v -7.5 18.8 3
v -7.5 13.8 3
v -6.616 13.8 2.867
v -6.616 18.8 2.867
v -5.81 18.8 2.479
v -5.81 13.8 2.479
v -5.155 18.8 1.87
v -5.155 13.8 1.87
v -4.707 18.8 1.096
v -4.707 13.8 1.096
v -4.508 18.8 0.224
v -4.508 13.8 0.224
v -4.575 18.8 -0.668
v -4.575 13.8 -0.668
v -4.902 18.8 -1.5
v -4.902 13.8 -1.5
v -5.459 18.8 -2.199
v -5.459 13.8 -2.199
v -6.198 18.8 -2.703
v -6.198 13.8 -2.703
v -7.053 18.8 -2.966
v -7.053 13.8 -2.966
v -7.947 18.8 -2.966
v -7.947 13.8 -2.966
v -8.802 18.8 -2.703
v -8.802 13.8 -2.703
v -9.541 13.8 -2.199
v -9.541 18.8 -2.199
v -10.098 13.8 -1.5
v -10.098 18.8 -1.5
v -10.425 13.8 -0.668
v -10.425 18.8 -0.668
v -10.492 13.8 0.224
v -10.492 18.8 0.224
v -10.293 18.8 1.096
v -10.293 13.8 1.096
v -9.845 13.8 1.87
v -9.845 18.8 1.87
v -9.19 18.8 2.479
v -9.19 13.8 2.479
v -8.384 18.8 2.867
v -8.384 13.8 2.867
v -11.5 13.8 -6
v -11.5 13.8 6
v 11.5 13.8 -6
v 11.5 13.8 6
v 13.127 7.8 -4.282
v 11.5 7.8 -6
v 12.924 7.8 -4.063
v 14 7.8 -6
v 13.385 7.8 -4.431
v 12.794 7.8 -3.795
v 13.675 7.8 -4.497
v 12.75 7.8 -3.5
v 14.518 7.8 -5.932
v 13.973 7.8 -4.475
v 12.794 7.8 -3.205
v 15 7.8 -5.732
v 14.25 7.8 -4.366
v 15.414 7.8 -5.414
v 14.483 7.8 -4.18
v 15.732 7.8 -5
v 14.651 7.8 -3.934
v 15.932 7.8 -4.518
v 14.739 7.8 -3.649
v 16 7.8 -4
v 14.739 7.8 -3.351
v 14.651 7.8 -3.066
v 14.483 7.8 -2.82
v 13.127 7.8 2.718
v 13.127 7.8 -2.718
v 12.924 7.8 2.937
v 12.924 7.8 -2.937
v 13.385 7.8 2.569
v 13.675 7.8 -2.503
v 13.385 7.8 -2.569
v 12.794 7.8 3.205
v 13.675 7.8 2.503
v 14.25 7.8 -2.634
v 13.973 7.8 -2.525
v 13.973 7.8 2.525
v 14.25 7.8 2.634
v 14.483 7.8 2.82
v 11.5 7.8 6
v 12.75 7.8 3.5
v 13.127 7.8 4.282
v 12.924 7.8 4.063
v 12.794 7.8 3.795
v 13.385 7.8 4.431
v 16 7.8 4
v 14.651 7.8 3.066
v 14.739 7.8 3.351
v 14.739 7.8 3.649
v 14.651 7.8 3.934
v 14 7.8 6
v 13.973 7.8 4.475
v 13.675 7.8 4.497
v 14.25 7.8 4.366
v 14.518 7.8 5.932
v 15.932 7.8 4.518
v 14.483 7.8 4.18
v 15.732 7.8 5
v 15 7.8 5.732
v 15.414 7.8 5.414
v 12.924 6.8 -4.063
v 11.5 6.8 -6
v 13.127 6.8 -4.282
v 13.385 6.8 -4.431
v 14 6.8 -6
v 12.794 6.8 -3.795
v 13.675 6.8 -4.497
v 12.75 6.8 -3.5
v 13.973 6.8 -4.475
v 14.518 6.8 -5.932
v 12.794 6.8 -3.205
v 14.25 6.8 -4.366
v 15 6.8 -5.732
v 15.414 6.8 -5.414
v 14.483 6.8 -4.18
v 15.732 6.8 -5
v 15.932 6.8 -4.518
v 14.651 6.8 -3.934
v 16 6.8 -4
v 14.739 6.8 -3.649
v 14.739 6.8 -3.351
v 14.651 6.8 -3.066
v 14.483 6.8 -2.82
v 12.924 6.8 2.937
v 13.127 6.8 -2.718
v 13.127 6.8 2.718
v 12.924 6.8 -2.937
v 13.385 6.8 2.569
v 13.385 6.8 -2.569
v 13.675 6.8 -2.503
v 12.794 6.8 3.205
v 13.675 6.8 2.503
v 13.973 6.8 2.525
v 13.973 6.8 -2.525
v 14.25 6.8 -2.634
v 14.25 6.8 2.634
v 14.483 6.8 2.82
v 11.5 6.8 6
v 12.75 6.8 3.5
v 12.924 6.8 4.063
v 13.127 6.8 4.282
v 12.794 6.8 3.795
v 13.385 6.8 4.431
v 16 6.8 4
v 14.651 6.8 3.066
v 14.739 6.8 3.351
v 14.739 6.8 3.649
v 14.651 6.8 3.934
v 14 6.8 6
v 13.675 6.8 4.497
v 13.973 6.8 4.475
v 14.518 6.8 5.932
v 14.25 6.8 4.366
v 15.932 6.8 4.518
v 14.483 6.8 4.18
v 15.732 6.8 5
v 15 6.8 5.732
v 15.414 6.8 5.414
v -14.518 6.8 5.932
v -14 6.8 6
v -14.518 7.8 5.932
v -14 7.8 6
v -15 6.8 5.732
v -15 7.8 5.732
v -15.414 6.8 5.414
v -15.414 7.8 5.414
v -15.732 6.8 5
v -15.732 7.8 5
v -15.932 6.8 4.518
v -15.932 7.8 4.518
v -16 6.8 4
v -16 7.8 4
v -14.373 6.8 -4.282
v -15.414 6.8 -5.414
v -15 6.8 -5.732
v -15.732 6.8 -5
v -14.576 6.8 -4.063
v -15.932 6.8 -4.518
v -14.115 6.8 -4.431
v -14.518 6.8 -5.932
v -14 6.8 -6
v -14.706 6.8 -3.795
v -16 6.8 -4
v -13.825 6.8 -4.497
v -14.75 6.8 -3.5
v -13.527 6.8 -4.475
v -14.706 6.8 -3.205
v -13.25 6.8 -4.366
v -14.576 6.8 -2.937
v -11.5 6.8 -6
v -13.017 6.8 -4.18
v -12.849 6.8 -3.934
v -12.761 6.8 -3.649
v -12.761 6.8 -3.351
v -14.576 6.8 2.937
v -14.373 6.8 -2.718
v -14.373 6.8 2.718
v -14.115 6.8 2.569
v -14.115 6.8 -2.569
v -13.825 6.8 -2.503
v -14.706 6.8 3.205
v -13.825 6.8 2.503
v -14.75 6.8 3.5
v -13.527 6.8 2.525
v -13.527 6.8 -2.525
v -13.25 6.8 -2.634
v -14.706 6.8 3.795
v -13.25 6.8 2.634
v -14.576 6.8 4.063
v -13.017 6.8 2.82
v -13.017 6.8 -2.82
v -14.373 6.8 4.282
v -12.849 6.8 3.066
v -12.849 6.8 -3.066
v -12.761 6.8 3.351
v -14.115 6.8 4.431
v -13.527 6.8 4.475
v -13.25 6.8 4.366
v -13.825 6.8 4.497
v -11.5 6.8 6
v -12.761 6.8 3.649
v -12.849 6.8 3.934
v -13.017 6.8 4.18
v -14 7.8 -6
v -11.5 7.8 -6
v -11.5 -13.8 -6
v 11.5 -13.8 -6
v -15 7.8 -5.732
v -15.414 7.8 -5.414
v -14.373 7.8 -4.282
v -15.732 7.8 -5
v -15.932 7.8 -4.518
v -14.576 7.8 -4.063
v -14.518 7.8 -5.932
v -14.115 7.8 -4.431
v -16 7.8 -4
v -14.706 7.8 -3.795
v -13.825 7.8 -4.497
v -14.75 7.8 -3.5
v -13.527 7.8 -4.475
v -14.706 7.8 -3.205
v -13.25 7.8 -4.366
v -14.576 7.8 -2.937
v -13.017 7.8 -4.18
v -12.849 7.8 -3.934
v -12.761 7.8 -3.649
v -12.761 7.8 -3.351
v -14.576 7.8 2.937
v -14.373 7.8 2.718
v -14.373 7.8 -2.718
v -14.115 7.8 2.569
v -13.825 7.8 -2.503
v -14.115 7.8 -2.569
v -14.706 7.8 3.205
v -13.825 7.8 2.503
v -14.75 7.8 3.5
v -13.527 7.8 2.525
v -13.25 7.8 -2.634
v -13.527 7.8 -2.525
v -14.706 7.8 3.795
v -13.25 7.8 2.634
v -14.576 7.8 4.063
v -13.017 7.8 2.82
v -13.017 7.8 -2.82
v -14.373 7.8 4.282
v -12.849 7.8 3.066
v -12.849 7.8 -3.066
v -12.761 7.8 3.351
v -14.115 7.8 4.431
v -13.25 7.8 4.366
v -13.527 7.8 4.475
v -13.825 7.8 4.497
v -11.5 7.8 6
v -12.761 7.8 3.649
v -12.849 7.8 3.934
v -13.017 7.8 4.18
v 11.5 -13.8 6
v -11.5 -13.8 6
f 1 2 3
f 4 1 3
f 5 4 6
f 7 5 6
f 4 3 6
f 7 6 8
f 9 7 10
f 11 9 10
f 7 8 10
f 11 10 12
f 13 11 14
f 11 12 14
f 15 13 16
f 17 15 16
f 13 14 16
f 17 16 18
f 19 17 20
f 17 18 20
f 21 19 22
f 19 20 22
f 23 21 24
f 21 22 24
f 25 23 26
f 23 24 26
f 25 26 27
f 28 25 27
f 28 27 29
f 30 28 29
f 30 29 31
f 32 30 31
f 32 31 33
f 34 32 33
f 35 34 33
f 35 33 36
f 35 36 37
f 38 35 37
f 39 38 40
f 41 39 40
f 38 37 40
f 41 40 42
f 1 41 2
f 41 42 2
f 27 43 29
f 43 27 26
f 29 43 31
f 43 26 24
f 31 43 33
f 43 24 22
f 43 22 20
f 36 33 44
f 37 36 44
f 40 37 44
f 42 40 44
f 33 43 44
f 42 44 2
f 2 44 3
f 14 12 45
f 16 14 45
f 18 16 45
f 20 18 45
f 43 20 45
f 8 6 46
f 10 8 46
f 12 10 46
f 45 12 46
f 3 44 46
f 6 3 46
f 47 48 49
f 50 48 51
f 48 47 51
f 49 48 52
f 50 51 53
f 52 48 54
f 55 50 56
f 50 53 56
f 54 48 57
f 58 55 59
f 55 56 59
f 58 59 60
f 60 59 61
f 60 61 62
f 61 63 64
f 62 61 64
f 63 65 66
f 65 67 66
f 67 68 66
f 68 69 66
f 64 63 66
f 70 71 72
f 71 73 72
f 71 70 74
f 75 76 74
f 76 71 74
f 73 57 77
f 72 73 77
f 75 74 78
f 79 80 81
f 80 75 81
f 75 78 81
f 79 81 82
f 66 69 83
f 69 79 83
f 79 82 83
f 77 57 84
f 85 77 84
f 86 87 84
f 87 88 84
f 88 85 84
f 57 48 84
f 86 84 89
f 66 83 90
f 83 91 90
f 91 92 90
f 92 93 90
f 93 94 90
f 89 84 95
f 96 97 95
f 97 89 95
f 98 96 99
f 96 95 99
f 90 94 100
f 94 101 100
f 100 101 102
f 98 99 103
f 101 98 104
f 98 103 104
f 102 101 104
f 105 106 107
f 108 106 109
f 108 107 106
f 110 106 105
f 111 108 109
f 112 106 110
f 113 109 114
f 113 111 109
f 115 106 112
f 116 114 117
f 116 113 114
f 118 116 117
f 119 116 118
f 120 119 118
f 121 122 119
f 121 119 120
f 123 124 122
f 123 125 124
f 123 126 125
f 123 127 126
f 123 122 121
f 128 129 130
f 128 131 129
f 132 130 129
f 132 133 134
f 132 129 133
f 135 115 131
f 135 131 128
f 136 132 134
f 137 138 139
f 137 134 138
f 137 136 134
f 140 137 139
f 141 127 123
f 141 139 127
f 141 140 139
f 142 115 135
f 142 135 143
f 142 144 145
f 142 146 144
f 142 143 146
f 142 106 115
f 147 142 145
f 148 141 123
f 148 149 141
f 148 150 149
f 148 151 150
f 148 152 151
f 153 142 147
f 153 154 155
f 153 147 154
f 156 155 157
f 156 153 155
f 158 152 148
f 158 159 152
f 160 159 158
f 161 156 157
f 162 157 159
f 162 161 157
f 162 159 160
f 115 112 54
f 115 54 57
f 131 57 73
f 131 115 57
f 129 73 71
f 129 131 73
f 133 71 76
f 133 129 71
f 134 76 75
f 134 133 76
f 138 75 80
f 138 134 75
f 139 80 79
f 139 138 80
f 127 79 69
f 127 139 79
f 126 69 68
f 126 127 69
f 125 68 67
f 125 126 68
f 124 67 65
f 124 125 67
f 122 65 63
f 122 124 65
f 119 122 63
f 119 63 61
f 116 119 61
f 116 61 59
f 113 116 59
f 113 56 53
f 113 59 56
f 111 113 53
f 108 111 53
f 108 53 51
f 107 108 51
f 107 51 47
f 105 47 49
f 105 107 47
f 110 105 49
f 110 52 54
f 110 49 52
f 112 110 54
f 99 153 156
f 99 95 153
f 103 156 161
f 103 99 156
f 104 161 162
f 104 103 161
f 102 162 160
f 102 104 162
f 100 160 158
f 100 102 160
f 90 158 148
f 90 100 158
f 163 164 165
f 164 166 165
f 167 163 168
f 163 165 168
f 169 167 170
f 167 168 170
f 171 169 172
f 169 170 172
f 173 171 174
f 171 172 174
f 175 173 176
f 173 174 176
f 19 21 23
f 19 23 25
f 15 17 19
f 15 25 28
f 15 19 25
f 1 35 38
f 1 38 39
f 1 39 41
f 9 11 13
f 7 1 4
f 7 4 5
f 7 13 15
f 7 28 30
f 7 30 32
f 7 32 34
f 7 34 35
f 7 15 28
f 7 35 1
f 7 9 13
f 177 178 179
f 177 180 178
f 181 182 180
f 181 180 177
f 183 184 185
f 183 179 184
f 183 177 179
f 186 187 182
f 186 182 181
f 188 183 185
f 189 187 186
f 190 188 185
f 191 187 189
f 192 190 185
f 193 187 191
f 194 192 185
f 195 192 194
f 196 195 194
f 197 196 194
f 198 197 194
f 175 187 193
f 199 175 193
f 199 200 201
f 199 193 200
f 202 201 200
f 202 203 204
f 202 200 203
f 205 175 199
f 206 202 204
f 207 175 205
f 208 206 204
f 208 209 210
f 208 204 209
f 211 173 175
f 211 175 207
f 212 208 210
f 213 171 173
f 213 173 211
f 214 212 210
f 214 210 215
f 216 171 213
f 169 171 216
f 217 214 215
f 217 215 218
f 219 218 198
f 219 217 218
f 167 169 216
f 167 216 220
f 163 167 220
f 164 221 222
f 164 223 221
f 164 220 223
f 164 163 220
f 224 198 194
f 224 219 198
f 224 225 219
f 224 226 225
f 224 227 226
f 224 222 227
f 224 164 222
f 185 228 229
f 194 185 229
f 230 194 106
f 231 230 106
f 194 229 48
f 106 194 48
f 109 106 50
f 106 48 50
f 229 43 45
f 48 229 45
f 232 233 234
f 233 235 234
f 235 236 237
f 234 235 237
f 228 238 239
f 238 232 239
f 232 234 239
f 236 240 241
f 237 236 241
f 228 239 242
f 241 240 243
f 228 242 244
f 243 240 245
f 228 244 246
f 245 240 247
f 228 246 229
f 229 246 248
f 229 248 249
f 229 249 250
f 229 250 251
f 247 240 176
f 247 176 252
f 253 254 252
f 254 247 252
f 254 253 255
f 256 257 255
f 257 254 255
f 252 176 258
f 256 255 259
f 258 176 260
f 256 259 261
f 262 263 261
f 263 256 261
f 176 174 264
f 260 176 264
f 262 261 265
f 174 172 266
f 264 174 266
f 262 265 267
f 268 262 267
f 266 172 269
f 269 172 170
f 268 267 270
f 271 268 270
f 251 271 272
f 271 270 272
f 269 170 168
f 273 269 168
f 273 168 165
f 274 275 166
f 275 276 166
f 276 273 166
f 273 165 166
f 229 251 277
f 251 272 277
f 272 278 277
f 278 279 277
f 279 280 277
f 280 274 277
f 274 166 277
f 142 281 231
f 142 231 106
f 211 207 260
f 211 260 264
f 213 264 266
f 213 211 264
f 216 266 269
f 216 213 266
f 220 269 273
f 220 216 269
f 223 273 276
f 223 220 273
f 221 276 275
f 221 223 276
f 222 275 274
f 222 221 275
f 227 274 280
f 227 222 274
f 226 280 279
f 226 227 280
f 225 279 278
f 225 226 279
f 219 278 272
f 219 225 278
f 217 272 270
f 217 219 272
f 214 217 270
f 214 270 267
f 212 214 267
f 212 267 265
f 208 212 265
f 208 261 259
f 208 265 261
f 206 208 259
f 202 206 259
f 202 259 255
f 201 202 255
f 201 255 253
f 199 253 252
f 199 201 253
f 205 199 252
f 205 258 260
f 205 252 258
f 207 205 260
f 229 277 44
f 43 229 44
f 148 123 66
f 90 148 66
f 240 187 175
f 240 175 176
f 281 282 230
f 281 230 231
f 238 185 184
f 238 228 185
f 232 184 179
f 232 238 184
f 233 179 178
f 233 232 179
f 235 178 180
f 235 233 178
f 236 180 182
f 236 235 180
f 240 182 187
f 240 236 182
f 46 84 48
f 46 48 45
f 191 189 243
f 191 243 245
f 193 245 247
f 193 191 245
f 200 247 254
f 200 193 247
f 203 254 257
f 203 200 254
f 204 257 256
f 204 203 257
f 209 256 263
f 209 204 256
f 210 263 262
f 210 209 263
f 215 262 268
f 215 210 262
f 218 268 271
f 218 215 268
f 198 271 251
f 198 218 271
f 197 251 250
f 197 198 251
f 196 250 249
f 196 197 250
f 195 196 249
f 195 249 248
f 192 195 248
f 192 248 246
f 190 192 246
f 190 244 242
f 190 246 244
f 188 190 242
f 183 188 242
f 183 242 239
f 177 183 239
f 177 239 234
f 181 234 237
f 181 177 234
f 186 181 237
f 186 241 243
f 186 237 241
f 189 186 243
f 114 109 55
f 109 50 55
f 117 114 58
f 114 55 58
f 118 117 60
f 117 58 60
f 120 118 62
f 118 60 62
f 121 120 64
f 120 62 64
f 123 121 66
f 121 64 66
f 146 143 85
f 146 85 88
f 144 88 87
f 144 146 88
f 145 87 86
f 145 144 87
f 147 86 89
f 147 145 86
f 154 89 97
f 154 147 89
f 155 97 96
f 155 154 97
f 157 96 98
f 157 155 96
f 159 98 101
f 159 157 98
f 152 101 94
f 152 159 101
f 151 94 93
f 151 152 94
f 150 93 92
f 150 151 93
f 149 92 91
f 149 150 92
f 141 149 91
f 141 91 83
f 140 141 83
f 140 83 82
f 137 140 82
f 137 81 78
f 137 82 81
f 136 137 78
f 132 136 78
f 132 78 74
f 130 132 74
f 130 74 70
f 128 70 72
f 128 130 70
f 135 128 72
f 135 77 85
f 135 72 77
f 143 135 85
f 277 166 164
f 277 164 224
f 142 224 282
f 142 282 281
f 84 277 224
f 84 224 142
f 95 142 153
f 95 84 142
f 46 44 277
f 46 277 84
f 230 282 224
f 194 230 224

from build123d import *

# Parameters (mm, degrees)
SKETCH_1_W               = 23
SKETCH_1_H               = 27.6
SKETCH_1_W_2             = 4.5
SKETCH_1_H_2             = 1
EXTRUDE_1_DEPTH          = 6
SKETCH_2_R               = 3
EXTRUDE_2_DEPTH          = 5
CUT_EXTRUDE_1_DEPTH      = 28.541967976
CUT_EXTRUDE_1_DEPTH_BACK = 28.541967976
SKETCH_3_R               = 1
FILLET_1_R               = 2


with BuildPart() as part:
    # Эскиз1 → Бобышка-Вытянуть1 (new, symmetric)
    with BuildSketch(Plane.XY):
        Rectangle(SKETCH_1_W, SKETCH_1_H)
        with Locations((-13.75, 7.3)):
            Rectangle(SKETCH_1_W_2, SKETCH_1_H_2)
        with Locations((13.75, 7.3)):
            Rectangle(SKETCH_1_W_2, SKETCH_1_H_2)
    extrude(amount=EXTRUDE_1_DEPTH, both=True)

    # Эскиз2 → Бобышка-Вытянуть2 (add)
    with BuildSketch(Plane(origin=(0, 13.8, 0), x_dir=(1, 0, 0), z_dir=(0, 1, 0))):
        with Locations(Location((-7.5, 0, 0), (0, 0, 270))):
            Circle(SKETCH_2_R)
    extrude(amount=EXTRUDE_2_DEPTH)

    # Эскиз3 → Вырез-Вытянуть1 (cut, two sides: drawn at the far end of the back side and taken through both)
    with BuildSketch(Plane(origin=(0, 7.8, 0), x_dir=(1, 0, 0), z_dir=(0, 1, 0)).offset(-CUT_EXTRUDE_1_DEPTH_BACK)):
        with Locations(Location((-13.75, 3.5, 0), (0, 0, 180))):
            Circle(SKETCH_3_R)
        with Locations(Location((-13.75, -3.5, 0), (0, 0, 180))):
            Circle(SKETCH_3_R)
        with Locations(Location((13.75, -3.5, 0), (0, 0, 180))):
            Circle(SKETCH_3_R)
        with Locations(Location((13.75, 3.5, 0), (0, 0, 180))):
            Circle(SKETCH_3_R)
    extrude(amount=CUT_EXTRUDE_1_DEPTH + CUT_EXTRUDE_1_DEPTH_BACK, mode=Mode.SUBTRACT)

    # Скругление1
    fillet_1_edges = [part.edges().sort_by_distance(p)[0] for p in [
        (-16, 7.3, -6),
        (16, 7.3, -6),
        (16, 7.3, 6),
        (-16, 7.3, 6),
    ]]
    fillet(fillet_1_edges, radius=FILLET_1_R)


solid = part.part
